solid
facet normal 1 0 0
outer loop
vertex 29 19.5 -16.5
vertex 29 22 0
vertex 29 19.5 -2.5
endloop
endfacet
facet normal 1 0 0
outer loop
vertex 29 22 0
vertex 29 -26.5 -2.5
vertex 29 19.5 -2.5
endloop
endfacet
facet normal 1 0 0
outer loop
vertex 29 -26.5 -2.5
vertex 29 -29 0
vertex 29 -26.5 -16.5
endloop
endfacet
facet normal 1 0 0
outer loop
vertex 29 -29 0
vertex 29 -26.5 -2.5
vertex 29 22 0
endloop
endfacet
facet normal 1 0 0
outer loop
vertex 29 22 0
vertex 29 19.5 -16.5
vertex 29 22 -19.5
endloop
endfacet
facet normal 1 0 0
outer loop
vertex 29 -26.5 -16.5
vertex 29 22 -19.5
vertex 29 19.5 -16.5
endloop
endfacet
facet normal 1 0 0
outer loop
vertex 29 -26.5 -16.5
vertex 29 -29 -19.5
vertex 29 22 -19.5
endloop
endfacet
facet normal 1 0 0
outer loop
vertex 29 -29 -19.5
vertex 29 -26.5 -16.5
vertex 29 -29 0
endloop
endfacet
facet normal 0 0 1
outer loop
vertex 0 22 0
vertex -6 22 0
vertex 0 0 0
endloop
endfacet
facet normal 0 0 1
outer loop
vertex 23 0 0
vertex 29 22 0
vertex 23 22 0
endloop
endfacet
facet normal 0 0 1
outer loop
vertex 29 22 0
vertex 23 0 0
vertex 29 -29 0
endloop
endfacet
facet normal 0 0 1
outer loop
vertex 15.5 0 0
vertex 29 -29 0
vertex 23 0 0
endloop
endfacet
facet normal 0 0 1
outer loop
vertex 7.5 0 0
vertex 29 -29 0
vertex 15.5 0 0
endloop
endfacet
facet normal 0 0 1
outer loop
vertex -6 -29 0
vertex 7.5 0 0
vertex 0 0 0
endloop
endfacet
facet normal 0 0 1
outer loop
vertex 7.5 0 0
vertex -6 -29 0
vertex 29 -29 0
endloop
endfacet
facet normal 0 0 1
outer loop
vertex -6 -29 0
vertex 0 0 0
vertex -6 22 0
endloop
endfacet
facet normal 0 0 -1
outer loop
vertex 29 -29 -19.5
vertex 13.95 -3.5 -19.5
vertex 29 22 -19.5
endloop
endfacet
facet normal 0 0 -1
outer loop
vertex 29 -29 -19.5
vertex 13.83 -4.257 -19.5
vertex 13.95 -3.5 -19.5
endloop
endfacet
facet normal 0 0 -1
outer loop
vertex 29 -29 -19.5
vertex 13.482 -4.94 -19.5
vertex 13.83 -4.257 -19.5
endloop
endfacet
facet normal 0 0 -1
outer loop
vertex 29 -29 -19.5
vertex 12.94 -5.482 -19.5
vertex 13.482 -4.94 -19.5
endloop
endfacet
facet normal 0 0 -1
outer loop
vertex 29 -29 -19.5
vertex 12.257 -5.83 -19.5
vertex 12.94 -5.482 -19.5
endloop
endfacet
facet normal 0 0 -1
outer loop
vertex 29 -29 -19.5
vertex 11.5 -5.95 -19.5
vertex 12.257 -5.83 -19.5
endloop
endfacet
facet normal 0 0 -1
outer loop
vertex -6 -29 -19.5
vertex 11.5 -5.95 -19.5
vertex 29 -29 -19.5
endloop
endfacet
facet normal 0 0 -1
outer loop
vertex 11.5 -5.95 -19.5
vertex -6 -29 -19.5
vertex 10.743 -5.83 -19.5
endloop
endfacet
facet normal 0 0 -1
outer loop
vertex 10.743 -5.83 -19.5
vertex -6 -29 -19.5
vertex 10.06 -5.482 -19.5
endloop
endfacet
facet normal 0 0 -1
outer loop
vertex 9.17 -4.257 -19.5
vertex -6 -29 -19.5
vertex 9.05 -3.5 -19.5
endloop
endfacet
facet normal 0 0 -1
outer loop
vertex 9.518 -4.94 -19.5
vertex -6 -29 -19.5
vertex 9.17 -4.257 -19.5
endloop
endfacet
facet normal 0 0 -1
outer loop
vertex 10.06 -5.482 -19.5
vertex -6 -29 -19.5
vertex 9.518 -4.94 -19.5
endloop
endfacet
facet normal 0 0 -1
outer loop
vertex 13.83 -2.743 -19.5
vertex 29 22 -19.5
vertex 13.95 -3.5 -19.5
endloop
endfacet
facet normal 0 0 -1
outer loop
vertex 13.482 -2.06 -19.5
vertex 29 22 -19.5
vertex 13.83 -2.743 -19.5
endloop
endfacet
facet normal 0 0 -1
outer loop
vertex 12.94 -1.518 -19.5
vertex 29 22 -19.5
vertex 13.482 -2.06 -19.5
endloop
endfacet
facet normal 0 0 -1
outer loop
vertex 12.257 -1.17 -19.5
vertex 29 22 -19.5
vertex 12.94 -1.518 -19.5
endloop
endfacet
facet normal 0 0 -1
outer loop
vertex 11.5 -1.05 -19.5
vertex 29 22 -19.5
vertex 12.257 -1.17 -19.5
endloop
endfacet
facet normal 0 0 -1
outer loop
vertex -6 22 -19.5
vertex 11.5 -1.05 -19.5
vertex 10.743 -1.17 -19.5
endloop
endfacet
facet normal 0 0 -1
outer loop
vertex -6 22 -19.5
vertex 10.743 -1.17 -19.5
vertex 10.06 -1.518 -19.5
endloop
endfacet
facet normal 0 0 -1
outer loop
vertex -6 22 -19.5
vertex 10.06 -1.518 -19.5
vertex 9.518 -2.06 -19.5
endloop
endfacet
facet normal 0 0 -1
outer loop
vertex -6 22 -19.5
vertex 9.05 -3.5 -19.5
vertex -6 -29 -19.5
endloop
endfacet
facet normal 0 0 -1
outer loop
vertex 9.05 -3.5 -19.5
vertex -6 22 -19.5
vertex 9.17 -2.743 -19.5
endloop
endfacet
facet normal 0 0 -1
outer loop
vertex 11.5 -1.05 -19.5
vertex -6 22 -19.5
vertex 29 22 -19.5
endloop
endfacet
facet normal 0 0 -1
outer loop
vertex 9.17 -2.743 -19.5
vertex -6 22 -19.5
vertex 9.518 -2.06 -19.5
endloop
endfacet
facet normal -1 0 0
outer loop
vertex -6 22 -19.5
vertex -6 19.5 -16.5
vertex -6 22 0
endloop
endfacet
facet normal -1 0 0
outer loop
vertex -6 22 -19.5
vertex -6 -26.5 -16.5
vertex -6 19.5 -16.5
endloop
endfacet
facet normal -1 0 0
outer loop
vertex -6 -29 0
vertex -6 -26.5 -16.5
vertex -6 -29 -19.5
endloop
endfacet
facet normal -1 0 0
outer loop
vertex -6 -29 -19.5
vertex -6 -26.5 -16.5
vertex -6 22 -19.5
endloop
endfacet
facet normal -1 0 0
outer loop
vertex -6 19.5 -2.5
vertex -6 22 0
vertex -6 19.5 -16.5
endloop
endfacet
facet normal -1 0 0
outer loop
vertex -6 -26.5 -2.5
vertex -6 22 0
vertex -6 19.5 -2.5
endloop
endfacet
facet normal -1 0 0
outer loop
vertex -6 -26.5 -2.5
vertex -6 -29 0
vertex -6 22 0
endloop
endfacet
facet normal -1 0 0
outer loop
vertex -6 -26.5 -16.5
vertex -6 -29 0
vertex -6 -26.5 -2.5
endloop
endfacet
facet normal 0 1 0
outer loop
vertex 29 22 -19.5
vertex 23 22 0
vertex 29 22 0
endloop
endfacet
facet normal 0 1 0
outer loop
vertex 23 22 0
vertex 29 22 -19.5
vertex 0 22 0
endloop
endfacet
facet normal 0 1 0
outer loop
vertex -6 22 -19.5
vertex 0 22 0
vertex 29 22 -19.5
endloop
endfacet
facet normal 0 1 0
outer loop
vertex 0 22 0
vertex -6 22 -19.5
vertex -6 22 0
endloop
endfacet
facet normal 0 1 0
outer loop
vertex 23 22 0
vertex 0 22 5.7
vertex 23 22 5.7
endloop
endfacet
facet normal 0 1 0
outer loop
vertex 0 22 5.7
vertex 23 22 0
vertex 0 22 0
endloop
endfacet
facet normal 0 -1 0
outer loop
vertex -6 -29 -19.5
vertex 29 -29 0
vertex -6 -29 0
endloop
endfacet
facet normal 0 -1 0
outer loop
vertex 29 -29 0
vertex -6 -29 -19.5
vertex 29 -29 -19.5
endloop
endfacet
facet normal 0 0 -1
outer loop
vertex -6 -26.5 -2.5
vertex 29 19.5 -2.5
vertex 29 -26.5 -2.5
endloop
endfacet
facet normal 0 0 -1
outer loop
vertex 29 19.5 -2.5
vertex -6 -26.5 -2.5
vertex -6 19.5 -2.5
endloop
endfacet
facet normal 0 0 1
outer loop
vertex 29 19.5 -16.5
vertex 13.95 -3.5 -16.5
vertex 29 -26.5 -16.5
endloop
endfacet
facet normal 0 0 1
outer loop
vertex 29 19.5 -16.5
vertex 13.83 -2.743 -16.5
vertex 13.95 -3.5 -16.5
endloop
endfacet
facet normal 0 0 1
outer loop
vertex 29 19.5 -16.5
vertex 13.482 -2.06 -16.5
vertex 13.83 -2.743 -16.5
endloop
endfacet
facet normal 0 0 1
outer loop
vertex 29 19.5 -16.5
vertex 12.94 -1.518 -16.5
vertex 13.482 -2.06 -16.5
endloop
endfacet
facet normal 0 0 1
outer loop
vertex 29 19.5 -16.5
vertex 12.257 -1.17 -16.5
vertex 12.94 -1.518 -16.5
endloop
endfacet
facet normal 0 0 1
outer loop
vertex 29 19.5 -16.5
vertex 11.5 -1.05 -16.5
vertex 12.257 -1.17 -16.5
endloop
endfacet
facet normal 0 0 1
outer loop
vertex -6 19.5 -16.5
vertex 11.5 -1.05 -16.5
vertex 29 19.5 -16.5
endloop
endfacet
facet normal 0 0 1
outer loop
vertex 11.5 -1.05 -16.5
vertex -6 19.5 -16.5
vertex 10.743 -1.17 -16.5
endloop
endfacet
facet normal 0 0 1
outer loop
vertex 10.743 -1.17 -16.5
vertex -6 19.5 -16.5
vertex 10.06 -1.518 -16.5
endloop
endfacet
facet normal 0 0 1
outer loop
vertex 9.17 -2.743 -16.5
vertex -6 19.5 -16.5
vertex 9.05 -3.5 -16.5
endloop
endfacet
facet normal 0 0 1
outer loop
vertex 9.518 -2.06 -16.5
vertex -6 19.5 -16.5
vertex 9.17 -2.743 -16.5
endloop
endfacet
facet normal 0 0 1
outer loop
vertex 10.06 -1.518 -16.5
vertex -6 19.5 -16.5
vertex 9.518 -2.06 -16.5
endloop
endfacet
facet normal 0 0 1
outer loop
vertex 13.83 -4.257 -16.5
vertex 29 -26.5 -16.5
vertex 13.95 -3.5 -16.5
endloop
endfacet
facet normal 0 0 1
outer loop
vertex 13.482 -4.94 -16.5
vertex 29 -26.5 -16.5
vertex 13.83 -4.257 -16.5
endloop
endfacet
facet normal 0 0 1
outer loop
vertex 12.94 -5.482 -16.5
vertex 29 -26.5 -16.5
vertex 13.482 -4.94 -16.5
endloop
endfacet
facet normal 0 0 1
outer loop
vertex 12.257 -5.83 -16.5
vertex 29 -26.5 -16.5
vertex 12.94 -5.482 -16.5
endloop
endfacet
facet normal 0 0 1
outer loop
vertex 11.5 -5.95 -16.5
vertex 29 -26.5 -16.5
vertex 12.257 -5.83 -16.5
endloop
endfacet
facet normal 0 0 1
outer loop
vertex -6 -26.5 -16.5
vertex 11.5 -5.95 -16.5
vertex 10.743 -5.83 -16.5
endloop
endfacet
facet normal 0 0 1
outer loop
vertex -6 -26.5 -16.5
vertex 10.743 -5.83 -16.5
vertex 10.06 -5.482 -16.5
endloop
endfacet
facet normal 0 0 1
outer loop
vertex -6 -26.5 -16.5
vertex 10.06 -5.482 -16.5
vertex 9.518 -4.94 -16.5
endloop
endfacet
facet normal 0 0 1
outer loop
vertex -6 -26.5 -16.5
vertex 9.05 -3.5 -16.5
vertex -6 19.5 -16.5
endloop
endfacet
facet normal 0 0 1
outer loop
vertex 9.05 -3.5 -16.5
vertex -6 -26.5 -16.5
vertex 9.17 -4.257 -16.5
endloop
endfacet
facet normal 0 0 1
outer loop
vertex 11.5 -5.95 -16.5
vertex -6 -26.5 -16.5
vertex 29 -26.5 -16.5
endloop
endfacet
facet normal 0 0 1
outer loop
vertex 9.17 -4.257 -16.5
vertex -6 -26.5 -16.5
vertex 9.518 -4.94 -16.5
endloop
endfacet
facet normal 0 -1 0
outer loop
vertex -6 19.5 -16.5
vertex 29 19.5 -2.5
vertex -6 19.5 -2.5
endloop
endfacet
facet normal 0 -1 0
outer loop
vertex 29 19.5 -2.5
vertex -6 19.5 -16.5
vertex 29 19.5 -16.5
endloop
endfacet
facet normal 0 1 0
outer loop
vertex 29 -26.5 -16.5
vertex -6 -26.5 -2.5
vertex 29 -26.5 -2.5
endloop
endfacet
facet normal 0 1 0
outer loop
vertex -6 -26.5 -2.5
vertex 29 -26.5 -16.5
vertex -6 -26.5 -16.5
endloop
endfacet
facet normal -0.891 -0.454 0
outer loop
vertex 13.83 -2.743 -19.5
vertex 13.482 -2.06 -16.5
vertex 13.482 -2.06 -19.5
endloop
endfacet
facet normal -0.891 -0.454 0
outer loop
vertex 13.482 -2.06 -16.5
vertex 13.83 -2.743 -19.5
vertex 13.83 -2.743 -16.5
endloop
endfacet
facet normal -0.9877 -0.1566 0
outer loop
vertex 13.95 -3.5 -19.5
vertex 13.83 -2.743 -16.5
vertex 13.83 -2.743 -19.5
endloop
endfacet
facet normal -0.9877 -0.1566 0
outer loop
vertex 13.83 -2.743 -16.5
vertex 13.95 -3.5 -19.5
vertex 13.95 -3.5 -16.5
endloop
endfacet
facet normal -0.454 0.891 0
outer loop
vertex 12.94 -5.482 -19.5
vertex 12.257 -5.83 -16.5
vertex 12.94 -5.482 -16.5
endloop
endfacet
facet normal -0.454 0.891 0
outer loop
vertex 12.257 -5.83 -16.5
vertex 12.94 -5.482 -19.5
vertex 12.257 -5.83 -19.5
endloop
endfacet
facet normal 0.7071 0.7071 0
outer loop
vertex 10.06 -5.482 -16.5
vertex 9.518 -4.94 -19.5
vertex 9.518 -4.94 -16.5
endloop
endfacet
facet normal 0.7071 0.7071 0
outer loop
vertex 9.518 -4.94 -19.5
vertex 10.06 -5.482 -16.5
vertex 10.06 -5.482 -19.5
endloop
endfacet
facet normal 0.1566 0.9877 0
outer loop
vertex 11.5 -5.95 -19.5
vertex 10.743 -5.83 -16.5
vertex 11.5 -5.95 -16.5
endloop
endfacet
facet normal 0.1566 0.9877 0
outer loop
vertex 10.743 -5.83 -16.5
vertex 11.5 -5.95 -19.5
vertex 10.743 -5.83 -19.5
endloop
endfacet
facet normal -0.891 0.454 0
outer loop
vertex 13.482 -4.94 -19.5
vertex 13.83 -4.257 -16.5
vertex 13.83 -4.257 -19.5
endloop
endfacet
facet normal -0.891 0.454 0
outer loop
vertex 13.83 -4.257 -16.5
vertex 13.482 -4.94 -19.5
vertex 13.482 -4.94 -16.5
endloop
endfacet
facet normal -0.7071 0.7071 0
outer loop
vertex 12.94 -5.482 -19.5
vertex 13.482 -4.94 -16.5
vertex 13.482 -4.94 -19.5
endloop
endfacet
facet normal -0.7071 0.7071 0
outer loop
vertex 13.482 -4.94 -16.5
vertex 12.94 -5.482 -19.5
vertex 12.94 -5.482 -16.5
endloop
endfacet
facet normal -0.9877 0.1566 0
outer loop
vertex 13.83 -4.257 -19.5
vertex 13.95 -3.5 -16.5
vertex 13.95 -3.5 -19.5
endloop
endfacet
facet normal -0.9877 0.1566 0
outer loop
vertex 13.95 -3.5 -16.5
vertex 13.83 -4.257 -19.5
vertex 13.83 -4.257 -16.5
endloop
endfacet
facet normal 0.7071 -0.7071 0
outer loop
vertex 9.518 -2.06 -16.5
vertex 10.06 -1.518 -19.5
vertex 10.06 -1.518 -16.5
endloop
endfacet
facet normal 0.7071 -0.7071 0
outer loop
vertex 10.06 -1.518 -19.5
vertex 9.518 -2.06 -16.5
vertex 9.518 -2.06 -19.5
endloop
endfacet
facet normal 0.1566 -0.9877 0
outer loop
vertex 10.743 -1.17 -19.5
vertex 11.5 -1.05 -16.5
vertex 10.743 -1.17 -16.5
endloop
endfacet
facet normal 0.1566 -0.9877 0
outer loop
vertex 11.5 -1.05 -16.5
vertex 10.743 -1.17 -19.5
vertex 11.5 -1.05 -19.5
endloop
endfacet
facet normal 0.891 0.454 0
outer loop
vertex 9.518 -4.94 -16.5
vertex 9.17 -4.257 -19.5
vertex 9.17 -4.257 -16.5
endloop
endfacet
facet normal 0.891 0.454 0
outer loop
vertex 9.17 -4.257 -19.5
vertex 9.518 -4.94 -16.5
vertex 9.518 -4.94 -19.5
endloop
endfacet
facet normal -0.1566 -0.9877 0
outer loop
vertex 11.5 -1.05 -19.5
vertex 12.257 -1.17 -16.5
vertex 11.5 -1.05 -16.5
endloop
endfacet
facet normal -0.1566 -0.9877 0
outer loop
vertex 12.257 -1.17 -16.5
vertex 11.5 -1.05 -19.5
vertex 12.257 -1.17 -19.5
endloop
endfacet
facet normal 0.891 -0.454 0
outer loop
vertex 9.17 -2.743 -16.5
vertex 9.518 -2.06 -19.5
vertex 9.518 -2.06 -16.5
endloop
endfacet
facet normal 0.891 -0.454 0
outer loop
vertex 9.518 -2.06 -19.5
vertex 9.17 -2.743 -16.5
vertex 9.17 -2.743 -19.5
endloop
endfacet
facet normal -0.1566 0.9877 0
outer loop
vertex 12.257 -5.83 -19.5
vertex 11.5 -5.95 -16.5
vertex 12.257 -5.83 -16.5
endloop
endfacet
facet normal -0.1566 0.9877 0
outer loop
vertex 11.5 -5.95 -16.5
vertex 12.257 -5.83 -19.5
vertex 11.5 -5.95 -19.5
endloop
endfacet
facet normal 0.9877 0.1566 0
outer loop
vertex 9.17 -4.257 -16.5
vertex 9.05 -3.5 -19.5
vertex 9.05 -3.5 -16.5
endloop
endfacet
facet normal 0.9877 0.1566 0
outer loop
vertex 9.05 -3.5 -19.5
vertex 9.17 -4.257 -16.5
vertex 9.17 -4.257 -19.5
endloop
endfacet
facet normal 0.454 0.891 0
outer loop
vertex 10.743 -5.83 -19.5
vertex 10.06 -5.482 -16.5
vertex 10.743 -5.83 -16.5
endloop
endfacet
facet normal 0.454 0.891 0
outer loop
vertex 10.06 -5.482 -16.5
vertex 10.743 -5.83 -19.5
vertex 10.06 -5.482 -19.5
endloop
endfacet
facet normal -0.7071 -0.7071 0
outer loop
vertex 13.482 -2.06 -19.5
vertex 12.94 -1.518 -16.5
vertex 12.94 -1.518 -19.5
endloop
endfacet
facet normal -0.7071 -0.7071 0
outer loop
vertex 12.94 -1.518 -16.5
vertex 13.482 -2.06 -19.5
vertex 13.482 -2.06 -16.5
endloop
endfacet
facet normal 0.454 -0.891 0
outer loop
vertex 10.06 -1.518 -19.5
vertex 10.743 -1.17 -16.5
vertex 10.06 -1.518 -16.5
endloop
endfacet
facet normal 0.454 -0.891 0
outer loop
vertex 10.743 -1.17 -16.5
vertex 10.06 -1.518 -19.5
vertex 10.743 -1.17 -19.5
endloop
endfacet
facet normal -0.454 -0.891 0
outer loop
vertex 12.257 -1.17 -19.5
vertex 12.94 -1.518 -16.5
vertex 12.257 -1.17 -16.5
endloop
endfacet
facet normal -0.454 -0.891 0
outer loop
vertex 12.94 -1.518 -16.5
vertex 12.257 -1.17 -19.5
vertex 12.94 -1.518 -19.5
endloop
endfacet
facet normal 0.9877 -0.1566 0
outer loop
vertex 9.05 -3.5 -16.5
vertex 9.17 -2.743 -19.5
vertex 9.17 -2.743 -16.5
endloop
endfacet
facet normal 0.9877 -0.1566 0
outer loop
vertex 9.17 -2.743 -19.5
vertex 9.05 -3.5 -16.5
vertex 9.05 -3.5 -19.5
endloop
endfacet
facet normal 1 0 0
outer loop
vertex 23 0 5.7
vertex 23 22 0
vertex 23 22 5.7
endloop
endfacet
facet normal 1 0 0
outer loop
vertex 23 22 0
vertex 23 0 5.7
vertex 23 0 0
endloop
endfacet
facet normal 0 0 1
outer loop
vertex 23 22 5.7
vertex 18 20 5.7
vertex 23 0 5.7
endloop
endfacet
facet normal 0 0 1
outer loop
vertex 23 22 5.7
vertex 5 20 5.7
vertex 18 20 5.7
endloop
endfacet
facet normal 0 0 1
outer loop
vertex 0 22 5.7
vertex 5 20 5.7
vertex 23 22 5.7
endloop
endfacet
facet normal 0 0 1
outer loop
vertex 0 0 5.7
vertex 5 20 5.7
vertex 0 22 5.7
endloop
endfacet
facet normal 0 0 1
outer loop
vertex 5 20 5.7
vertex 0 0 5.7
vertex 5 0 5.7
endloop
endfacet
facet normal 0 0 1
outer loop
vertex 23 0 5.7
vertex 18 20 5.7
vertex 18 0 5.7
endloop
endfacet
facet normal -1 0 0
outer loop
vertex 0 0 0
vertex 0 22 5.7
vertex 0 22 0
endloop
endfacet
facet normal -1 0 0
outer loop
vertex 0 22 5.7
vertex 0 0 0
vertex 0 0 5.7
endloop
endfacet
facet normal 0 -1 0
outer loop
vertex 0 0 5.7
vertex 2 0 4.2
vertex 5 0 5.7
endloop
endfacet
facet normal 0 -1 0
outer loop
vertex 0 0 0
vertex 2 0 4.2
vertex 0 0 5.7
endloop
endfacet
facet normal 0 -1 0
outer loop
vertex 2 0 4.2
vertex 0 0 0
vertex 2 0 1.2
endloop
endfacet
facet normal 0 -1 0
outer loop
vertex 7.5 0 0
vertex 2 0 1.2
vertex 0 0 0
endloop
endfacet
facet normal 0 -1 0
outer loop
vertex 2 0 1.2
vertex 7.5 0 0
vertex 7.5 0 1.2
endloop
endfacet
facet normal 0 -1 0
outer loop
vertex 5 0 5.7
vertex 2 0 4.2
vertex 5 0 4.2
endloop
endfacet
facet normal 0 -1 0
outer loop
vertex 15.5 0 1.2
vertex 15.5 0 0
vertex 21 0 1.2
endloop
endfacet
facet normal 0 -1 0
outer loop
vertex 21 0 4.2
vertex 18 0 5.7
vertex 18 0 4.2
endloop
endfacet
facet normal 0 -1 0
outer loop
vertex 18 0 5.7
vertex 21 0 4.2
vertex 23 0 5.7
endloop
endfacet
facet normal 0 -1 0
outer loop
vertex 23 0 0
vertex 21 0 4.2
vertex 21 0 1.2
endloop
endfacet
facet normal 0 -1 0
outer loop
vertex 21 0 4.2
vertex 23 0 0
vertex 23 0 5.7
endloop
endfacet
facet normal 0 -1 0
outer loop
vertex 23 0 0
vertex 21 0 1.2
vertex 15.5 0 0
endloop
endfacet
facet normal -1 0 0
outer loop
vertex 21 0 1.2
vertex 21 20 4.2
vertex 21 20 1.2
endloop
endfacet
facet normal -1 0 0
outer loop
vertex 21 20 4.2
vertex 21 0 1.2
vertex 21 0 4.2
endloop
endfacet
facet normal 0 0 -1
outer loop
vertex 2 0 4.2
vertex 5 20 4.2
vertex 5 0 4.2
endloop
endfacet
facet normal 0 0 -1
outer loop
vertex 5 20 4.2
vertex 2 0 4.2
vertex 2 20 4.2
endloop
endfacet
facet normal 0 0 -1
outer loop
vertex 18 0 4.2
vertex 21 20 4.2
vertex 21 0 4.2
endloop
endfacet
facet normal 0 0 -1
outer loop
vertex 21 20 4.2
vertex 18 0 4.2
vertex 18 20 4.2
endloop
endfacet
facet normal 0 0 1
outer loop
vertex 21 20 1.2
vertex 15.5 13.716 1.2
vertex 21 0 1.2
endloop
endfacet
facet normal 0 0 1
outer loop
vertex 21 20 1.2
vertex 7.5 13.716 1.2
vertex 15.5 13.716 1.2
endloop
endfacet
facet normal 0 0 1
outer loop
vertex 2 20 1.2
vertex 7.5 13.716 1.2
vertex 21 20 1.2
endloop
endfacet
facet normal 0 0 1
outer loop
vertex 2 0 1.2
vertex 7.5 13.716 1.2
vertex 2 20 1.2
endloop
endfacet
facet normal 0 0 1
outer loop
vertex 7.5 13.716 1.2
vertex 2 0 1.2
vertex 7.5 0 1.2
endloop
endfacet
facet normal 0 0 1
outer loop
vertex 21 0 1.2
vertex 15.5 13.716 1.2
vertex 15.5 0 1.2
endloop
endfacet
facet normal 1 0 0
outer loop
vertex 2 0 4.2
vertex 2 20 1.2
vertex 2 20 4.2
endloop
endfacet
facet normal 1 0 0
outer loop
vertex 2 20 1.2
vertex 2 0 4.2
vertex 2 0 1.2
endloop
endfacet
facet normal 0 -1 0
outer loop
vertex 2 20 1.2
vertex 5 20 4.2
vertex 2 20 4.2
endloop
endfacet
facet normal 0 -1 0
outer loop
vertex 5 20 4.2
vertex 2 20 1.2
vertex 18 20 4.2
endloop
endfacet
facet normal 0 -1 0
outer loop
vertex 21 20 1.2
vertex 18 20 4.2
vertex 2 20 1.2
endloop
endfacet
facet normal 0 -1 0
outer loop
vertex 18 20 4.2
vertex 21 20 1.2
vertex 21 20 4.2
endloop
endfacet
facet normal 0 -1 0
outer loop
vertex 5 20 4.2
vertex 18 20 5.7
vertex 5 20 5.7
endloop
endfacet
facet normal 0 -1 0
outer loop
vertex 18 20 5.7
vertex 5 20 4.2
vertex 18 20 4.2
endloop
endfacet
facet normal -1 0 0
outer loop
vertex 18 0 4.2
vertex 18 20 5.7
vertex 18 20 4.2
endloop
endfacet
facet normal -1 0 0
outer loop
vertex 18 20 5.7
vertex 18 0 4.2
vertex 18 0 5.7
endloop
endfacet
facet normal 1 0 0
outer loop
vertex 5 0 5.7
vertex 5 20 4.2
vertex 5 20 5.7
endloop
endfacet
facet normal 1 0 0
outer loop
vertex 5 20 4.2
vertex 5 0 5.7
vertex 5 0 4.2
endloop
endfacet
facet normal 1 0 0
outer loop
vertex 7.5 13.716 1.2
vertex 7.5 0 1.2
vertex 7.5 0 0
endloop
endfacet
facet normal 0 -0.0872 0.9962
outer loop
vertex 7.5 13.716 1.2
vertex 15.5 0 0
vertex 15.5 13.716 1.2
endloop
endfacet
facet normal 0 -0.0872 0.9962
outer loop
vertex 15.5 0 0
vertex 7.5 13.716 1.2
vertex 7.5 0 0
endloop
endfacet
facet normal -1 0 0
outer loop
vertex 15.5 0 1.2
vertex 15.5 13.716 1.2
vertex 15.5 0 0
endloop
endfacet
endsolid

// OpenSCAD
//Hot shoe ziptie adapeter

hs_width = 19;
hs_depth = 20;
hs_height = 3;
hs_slot_width = 13;
hs_slot_height = 1.5;

slope_width = 8;
slope_angle = 5;

ziptie_slot_width = 4;
ziptie_slot_height = 2;

wall_width = 2;
wall_height = 1.2;

//offset for ziptie_base
ziptie_offset1=2.5;

//offset for ziptie_base_90
ziptie_offset2=0;

ziptie_base_height = wall_width+ziptie_slot_height;
base_width = wall_width*2+hs_width;
base_depth = hs_depth+wall_width;

module hot_shoe() {
    //base cube
    difference() {
        cube([base_width, base_depth, wall_height+hs_slot_height+hs_height]);
        //hot shoe cut cube
        translate([wall_width, 0, wall_height]) cube([hs_width, hs_depth, hs_height]);
        //slot cut cube
        translate([wall_width + 0.5*(hs_width-hs_slot_width), 0, wall_height+hs_height]) cube([hs_slot_width, hs_depth, hs_slot_height]);
        //slope cut cube
        slope_x = 0.5*(base_width-slope_width);
        //slope_z = wall_width*0.8;
        slope_z = 0;
        translate([slope_x,0,slope_z]) rotate([slope_angle, 0, 0]) cube([slope_width, hs_depth, wall_width]);        
    }
}
module ziptie_base() {
    module ziptie_cut() {
      cube([ziptie_slot_width, base_depth, ziptie_slot_height]);
    }
    slot1_x = base_width/3-0.5*ziptie_slot_width-ziptie_offset1;
    slot2_x = (2*base_width/3)-0.5*ziptie_slot_width+ziptie_offset1;
    difference() {
        //base cube
        cube([base_width, base_depth, ziptie_base_height]);
        //ziptie slots
        translate([slot1_x, 0, wall_width]) ziptie_cut();
        translate([slot2_x, 0, wall_width]) ziptie_cut();
    }
    
    
}
module ziptie_base_90() {
    module ziptie_cut() {
      cube([base_width, ziptie_slot_width, ziptie_slot_height]);
    }
    slot1_y = base_width/3-0.5*ziptie_slot_width-ziptie_offset2;
    slot2_y = (2*base_width/3)-0.5*ziptie_slot_width+ziptie_offset2;
    difference() {
        //base cube
        cube([base_width, base_depth, ziptie_base_height]);
        //ziptie slots
        translate([0, slot1_y, wall_width]) ziptie_cut();
        translate([0, slot2_y, wall_width]) ziptie_cut();
    }
    
    
}

module plank_mount_base(x, y, d) {
  slider_width = 35;
  wall_bottom = 3;
  wall = 2.5;
  
  t_x = slider_width;
  t_y = x + 2 * wall;
  t_z = y + wall + wall_bottom;
  
  x_offset = 0.5 * (t_x - base_width);
  translate([-x_offset, -t_y+base_depth, -t_z])
  difference() {
    cube([t_x, t_y, t_z]);
    translate([0, wall, wall_bottom]) cube([t_x, x, y]);
    translate([0.5 * t_x, 0.5 * t_y, 0]) cylinder(h=wall_bottom, d=d, $fn=20);
  }
  
    
}
plank_x = 46;
plank_y = 14;
hole_dia = 4.9;
translate() plank_mount_base(plank_x, plank_y, hole_dia);
//translate([0, 0, -ziptie_base_height]) ziptie_base_90();
hot_shoe();
